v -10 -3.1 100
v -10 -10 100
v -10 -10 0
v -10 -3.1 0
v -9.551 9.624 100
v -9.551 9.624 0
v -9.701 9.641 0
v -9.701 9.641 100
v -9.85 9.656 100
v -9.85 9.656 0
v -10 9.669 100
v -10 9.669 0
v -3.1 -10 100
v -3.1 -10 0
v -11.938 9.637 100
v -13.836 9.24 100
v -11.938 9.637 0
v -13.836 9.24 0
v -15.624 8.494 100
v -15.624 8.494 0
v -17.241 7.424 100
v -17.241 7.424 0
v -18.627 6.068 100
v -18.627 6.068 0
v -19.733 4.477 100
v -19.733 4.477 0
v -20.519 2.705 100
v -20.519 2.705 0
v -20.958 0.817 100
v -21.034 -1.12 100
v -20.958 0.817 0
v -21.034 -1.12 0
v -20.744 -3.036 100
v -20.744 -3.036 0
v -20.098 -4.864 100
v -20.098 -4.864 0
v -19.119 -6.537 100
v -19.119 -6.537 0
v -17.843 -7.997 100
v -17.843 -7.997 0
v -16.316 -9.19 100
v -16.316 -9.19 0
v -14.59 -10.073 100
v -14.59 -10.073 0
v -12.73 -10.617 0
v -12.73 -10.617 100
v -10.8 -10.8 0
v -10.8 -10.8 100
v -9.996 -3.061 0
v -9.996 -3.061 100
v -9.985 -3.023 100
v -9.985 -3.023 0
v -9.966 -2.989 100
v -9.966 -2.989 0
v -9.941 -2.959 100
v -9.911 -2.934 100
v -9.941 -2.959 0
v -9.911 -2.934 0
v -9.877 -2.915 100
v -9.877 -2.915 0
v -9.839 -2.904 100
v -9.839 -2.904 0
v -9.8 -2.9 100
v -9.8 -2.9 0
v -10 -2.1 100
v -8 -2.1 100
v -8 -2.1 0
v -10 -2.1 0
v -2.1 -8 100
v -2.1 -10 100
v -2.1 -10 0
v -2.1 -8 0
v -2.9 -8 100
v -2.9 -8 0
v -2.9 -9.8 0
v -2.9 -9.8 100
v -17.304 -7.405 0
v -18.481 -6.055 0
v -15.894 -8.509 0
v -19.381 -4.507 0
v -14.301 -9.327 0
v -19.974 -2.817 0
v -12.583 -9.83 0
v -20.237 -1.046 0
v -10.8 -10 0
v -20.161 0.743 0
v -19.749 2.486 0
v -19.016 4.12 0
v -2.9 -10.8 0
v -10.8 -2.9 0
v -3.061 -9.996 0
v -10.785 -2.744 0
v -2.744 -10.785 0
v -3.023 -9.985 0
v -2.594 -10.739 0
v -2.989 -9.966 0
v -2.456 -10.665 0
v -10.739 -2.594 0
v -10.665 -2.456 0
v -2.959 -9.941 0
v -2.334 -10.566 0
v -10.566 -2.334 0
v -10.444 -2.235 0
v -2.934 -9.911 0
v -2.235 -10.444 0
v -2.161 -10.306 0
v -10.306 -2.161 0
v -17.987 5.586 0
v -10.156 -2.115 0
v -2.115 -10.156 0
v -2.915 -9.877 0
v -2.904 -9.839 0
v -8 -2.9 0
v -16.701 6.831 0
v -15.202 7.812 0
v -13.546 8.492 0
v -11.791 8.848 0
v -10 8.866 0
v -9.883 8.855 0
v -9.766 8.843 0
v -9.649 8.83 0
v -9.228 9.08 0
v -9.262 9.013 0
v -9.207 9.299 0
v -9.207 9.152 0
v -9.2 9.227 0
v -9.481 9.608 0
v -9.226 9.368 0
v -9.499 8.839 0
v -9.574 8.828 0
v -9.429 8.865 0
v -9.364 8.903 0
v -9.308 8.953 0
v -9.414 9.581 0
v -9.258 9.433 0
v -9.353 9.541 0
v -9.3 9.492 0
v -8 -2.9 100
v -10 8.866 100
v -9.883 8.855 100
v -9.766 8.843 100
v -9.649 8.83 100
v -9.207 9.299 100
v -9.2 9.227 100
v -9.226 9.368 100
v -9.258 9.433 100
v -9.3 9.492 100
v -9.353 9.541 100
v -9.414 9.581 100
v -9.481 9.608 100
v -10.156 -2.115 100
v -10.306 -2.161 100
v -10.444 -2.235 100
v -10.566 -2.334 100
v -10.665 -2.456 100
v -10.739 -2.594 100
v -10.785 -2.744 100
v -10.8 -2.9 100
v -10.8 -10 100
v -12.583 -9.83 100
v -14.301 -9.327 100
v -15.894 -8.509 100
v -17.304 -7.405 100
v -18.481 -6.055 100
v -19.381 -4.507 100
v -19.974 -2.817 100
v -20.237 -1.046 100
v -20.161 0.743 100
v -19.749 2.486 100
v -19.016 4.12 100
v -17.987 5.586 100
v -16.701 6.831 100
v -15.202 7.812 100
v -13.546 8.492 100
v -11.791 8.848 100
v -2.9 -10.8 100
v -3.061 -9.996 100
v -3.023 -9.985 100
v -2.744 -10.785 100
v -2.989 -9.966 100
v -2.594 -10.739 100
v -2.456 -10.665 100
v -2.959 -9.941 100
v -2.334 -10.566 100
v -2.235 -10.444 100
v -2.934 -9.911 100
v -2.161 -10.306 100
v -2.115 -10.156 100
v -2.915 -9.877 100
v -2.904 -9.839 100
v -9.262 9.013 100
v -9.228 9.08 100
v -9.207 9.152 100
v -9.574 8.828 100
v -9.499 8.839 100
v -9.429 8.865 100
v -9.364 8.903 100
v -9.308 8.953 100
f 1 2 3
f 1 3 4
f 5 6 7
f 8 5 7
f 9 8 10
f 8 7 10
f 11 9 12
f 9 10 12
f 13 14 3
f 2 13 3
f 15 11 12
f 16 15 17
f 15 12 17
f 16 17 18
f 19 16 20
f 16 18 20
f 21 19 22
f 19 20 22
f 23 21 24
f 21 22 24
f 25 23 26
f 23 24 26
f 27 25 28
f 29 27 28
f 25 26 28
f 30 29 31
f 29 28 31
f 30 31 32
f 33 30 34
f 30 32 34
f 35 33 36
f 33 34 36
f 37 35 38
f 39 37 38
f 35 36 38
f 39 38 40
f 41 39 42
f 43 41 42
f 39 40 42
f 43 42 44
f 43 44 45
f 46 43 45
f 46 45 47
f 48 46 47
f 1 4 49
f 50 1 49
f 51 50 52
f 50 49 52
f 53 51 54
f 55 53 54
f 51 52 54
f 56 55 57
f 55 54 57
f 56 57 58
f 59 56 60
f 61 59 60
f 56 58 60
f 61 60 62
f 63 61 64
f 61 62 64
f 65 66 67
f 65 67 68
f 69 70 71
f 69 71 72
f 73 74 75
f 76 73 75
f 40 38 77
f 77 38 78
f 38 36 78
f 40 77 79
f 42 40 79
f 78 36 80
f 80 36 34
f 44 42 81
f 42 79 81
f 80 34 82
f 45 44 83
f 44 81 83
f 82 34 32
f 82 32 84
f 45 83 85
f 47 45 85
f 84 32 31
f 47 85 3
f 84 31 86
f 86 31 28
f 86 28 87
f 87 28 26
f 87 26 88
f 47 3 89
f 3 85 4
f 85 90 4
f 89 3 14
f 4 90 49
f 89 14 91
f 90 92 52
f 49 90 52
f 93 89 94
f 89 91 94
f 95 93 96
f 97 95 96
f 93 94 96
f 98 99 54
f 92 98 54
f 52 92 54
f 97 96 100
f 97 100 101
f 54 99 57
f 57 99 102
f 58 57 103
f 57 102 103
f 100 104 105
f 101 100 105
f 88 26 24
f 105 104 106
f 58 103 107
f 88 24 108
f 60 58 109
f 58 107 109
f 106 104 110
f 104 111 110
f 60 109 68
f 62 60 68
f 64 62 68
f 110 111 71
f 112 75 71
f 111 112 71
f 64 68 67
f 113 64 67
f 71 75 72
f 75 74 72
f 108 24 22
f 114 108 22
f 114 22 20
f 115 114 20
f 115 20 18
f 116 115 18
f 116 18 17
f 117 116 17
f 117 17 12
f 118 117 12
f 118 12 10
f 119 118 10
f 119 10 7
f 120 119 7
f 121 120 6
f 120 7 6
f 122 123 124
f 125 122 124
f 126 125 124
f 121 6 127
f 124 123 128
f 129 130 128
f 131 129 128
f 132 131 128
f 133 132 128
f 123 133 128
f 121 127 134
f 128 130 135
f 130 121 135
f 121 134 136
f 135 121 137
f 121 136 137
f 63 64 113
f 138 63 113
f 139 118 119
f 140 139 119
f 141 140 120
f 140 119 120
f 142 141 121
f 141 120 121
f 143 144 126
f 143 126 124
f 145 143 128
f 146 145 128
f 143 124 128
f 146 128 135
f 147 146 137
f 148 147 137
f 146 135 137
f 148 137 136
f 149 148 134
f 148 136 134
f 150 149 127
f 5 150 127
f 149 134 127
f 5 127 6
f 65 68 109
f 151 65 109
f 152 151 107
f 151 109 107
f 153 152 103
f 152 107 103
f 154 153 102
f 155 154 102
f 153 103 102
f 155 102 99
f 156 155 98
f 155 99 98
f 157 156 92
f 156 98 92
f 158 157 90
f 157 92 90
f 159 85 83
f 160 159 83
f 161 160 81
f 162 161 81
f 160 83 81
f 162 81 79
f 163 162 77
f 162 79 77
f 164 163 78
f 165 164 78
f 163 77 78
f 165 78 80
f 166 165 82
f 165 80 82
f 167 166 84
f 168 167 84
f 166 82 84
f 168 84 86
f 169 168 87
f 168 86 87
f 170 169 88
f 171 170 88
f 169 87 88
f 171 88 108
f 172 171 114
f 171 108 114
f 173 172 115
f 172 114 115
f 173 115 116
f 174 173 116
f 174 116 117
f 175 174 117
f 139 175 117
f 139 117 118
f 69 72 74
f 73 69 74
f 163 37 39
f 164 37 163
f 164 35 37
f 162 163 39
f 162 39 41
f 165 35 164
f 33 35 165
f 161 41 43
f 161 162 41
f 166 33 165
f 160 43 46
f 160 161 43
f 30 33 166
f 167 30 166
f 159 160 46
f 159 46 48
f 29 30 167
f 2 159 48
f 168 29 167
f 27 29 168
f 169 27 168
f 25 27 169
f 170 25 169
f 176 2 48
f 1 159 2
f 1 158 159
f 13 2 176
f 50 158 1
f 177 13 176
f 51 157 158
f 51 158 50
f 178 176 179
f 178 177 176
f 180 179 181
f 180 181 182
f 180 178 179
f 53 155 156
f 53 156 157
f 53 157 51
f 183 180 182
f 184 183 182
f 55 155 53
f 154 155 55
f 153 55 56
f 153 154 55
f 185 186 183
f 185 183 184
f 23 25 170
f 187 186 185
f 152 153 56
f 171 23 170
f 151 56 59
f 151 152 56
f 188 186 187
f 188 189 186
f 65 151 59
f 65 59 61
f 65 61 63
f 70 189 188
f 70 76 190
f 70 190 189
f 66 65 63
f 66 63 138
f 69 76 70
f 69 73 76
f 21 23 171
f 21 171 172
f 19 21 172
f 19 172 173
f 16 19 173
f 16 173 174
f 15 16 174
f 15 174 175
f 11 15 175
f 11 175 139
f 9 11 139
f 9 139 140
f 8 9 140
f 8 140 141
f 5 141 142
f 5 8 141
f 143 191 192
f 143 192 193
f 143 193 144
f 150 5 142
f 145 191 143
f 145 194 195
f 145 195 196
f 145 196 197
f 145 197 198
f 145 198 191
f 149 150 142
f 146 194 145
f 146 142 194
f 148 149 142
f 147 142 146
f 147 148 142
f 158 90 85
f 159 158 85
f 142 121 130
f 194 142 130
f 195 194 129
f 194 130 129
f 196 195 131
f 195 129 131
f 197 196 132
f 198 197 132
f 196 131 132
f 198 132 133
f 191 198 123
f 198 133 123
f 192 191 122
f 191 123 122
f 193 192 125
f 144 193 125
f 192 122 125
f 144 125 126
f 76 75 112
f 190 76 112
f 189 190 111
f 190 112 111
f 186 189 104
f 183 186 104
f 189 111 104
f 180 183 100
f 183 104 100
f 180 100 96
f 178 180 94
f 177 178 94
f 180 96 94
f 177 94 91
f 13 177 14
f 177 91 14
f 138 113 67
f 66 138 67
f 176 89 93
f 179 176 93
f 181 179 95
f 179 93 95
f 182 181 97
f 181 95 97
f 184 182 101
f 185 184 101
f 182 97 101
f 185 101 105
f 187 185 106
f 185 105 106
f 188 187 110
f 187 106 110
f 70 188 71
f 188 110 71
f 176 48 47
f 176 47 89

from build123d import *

# Parameters (mm, degrees)
F1_DEPTH = 100


with BuildPart() as f1:
    # F0 (on Top) → F1 (new body)
    with BuildSketch(Plane.XY):
        with BuildLine():
            ThreePointArc((-10, 9.6687327982), (-21.0421802167, -0.1496946047), (-10.8, -10.8))
            Line((-10.8, -10.8), (-10.8, -10))
            ThreePointArc((-10.8, -10), (-20.2415153605, -0.1496405391), (-10, 8.8660766777))
            Line((-10, 8.8660766777), (-10, 9.2266302988))
            Line((-10, 9.2266302988), (-10, 9.6687327982))
        make_face()
        with BuildLine():
            Line((-10.8, -2.9), (-10.8, -10))
            ThreePointArc((-10.8, -10), (-10.3996405391, -9.9915153605), (-10, -9.9660766777))
            Line((-10, -9.9660766777), (-10, -3.1))
            ThreePointArc((-10, -3.1), (-9.9414213562, -2.9585786438), (-9.8, -2.9))
            Line((-9.8, -2.9), (-8, -2.9))
            Line((-8, -2.9), (-8, -2.1))
            Line((-8, -2.1), (-10, -2.1))
            ThreePointArc((-10, -2.1), (-10.5656854249, -2.3343145751), (-10.8, -2.9))
        make_face()
        with BuildLine():
            Line((-10.8, -10), (-10.8, -10.8))
            ThreePointArc((-10.8, -10.8), (-8.7751543269, -10.5980097532), (-6.8301133517, -10))
            Line((-6.8301133517, -10), (-10, -10))
            Line((-10, -10), (-10, -9.9660766777))
            ThreePointArc((-10, -9.9660766777), (-10.3996405391, -9.9915153605), (-10.8, -10))
        make_face()
        with BuildLine():
            Line((-2.1, -10), (-2.1, -8))
            Line((-2.1, -8), (-2.9, -8))
            Line((-2.9, -8), (-2.9, -9.8))
            ThreePointArc((-2.9, -9.8), (-2.9585786438, -9.9414213562), (-3.1, -10))
            Line((-3.1, -10), (-6.8301133517, -10))
            ThreePointArc((-6.8301133517, -10), (-8.7751543269, -10.5980097532), (-10.8, -10.8))
            Line((-10.8, -10.8), (-2.9, -10.8))
            ThreePointArc((-2.9, -10.8), (-2.3343145751, -10.5656854249), (-2.1, -10))
        make_face()
        with BuildLine():
            ThreePointArc((-9.5512689743, 9.6236508111), (-9.8650543244, 9.5262070088), (-10, 9.2266302988))
            ThreePointArc((-10, 9.2266302988), (-9.8995766936, 8.9615759561), (-9.6487309769, 8.8296097806))
            ThreePointArc((-9.6487309769, 8.8296097806), (-9.3349456572, 8.9270536052), (-9.2, 9.2266302988))
            ThreePointArc((-9.2, 9.2266302988), (-9.3004232901, 9.4916846232), (-9.5512689743, 9.6236508111))
        make_face()
        with BuildLine():
            ThreePointArc((-9.5512689743, 9.6236508111), (-9.7753865117, 9.6486600688), (-10, 9.6687327982))
            Line((-10, 9.6687327982), (-10, 9.2266302988))
            ThreePointArc((-10, 9.2266302988), (-9.8650543244, 9.5262070088), (-9.5512689743, 9.6236508111))
        make_face()
        with BuildLine():
            ThreePointArc((-9.6487309769, 8.8296097806), (-9.8995766936, 8.9615759561), (-10, 9.2266302988))
            Line((-10, 9.2266302988), (-10, 8.8660766777))
            ThreePointArc((-10, 8.8660766777), (-9.8241951226, 8.8494842859), (-9.6487309769, 8.8296097806))
        make_face()
    extrude(amount=F1_DEPTH)


solid = f1.part
